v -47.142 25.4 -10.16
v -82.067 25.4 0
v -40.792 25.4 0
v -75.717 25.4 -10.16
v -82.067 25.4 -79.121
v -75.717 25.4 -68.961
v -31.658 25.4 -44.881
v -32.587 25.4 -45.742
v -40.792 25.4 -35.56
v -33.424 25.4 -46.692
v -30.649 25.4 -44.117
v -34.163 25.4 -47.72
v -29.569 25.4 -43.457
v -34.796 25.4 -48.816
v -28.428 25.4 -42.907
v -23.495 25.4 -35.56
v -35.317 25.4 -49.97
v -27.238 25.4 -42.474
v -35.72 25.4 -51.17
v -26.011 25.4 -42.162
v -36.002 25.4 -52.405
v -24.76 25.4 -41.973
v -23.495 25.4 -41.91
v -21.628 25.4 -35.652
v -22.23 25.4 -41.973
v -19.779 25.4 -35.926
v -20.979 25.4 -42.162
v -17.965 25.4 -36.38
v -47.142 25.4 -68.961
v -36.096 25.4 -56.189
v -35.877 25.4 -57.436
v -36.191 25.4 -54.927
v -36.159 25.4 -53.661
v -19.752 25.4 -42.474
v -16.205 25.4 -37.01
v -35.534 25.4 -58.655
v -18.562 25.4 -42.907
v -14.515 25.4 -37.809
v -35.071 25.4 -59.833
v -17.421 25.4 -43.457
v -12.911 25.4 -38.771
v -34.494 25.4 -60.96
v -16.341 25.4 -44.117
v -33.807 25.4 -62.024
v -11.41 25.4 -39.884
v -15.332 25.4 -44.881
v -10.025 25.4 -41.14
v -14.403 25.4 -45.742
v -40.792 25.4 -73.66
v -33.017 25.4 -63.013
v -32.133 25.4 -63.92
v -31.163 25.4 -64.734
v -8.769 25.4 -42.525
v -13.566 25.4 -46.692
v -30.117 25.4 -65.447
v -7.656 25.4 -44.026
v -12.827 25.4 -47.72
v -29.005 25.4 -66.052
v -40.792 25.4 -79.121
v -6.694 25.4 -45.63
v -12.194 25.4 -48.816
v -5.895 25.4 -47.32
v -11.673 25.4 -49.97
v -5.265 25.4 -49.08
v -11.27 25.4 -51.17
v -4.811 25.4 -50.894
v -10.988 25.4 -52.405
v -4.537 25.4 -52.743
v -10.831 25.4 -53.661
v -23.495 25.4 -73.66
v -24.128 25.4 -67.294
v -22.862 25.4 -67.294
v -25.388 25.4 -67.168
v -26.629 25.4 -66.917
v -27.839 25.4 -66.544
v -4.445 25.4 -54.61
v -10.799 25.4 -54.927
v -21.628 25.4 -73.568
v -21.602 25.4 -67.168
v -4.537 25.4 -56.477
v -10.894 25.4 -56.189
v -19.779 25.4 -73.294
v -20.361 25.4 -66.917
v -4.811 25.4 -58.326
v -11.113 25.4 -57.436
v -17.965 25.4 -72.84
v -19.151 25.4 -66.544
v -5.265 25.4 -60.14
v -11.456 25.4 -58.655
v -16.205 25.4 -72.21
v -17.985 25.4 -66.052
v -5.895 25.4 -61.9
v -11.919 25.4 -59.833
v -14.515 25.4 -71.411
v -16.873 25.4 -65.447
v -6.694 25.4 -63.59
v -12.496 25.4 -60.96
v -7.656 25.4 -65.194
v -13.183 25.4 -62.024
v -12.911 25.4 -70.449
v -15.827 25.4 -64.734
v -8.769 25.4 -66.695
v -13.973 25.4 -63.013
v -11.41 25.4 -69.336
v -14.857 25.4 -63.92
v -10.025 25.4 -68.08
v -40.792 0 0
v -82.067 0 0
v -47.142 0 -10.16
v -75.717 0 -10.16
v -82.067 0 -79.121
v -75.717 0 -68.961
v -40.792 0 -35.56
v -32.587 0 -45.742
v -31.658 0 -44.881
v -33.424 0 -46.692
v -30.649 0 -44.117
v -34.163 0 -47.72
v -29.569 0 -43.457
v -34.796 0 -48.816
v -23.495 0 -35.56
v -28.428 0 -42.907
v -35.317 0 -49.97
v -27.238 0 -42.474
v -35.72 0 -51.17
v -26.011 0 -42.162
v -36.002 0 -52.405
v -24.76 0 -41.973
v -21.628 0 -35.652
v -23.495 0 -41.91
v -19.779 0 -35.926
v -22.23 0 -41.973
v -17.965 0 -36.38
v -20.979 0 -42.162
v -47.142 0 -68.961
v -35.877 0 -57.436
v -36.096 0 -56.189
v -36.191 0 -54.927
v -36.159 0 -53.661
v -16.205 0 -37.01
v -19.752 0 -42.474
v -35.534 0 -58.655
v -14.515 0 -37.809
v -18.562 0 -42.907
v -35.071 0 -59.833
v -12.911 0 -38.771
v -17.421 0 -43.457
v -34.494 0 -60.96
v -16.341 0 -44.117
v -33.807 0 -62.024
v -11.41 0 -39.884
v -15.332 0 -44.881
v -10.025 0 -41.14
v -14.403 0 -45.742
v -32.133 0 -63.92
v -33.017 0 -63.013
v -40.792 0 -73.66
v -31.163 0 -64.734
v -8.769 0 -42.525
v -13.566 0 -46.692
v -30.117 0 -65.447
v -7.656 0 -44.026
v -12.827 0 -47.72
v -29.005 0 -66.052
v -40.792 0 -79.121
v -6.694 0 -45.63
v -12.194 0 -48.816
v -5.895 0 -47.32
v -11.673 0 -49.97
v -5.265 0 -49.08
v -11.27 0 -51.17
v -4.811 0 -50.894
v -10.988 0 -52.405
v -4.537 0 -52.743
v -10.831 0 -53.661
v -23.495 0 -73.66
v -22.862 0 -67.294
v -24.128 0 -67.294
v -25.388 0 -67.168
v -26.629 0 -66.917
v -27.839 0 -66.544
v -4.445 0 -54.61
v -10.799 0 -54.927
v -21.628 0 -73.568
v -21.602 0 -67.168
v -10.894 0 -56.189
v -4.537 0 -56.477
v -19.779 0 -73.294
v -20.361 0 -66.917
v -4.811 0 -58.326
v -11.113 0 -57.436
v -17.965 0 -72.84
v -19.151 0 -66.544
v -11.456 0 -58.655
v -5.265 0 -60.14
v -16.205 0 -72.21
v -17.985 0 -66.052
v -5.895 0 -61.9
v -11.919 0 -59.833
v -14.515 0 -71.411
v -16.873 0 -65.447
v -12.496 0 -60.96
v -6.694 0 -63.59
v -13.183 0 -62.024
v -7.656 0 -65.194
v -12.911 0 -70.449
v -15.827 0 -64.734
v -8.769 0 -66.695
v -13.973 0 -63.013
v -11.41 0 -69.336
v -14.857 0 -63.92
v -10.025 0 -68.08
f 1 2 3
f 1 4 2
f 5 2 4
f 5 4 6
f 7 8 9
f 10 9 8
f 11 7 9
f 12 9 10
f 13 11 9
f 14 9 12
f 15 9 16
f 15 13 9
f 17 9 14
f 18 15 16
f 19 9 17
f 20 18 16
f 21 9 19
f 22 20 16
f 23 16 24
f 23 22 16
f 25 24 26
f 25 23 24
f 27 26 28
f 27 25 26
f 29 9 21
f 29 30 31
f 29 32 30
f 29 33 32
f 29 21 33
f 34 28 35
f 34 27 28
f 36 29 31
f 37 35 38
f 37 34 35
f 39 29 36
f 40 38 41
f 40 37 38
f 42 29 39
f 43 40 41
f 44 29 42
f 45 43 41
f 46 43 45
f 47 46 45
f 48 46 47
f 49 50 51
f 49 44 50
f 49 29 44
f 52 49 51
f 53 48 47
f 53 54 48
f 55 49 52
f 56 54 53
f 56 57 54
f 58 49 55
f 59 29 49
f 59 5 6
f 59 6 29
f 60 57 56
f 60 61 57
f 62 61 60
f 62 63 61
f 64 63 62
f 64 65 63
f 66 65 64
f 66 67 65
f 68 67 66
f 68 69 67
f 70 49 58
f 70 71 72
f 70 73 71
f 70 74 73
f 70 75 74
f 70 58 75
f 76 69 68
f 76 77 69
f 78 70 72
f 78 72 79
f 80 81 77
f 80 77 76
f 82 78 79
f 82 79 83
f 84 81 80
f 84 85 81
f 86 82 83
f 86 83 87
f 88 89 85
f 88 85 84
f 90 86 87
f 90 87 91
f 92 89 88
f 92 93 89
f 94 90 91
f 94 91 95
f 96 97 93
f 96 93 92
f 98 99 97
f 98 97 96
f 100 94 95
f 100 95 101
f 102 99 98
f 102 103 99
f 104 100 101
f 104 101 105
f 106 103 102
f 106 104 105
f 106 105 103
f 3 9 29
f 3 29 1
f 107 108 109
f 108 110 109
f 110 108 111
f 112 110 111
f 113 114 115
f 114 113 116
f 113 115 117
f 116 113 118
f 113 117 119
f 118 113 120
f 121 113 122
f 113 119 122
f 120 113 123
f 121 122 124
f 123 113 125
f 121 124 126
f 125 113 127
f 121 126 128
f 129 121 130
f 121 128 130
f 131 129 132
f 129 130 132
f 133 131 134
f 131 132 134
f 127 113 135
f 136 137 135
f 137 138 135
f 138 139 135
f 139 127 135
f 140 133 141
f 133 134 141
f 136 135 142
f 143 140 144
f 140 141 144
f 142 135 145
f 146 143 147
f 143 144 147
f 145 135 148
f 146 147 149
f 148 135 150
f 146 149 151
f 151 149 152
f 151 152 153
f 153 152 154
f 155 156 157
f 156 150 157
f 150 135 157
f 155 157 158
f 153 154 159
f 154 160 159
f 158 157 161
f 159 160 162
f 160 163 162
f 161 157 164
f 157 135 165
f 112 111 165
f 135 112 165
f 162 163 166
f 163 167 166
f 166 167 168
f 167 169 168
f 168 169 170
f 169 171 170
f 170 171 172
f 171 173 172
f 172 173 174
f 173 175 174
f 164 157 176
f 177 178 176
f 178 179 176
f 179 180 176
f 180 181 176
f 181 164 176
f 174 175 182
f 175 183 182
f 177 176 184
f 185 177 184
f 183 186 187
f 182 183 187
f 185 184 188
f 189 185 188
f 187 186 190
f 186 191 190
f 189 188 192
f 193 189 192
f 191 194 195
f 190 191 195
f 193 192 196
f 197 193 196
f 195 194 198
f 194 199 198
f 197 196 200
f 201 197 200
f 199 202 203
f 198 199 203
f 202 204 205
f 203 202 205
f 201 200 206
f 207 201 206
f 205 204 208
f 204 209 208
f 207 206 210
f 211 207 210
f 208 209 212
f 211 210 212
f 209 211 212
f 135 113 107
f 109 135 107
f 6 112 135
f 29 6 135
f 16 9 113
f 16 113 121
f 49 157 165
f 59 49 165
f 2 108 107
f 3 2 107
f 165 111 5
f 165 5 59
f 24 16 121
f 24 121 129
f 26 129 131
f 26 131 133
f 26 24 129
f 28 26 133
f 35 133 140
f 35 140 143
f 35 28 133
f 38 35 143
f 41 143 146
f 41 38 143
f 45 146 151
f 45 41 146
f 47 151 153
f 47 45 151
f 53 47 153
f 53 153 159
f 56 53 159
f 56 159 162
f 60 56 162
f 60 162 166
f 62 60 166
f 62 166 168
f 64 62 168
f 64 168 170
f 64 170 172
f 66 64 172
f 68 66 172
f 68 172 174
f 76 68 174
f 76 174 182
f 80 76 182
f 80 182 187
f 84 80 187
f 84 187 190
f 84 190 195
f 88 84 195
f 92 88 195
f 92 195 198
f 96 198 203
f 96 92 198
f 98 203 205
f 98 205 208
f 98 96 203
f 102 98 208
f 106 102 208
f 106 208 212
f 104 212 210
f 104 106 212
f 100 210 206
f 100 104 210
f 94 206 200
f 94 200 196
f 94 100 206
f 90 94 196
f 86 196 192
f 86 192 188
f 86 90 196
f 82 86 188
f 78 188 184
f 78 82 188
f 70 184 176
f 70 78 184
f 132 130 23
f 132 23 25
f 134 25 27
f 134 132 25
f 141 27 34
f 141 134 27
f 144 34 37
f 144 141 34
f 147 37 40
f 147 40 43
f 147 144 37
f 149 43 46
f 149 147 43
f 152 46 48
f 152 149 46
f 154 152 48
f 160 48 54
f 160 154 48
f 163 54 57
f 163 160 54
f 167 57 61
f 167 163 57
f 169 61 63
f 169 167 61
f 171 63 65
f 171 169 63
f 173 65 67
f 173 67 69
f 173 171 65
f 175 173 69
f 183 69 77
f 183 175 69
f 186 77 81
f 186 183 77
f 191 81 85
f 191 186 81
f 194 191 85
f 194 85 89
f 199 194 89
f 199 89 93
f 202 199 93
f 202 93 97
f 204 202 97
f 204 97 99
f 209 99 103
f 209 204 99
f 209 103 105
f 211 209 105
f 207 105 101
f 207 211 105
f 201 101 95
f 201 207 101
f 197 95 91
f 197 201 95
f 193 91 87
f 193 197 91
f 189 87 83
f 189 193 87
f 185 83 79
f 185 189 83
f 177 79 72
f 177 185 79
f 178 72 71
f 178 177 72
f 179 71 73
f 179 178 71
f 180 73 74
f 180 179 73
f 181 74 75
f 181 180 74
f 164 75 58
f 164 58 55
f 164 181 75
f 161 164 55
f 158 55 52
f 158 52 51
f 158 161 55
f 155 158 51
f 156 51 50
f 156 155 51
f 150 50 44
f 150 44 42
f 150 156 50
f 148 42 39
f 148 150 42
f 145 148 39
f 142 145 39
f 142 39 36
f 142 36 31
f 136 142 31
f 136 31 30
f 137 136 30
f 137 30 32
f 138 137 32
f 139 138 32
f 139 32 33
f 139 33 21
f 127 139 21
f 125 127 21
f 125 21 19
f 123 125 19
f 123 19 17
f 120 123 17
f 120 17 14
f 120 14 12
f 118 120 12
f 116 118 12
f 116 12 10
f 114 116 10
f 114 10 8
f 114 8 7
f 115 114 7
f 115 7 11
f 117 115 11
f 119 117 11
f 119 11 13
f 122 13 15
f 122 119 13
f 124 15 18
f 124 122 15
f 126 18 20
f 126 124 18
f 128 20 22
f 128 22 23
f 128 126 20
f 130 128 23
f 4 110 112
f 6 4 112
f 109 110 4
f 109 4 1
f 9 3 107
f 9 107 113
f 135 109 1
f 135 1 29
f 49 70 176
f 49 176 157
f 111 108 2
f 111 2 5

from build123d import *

# Parameters (mm, degrees)
SKETCH1_W           = 82.0674
SKETCH1_H           = 79.121
SKETCH1_R           = 12.7
SKETCH1_W_2         = 28.575
SKETCH1_H_2         = 58.801
BOSS_EXTRUDE1_DEPTH = 25.4
CUT_EXTRUDE1_REACH  = 118.792


with BuildPart() as part:
    # Sketch1 → Boss-Extrude1 (new body)
    with BuildSketch(Plane(origin=(0, 0, 0), x_dir=(1, 0, 0), z_dir=(0, 1, 0))):
        with Locations((-41.0337, 39.5605)):
            Rectangle(SKETCH1_W, SKETCH1_H)
        with Locations(Location((-23.495, 54.61, 0), (0, 0, 270))):
            Circle(SKETCH1_R, mode=Mode.SUBTRACT)
        with Locations((-61.4299, 39.5605)):
            Rectangle(SKETCH1_W_2, SKETCH1_H_2, mode=Mode.SUBTRACT)
    extrude(amount=BOSS_EXTRUDE1_DEPTH)

    # Sketch2 → Cut-Extrude1 (cut, up to next)
    with BuildSketch(Plane(origin=(0, 25.4, 0), x_dir=(1, 0, 0), z_dir=(0, 1, 0)), mode=Mode.PRIVATE) as cut_extrude1_sk1:
        with BuildLine():
            Line((-40.7924, 0), (-40.7924, 35.56))
            Line((-40.7924, 35.56), (-23.495, 35.56))
            ThreePointArc((-23.495, 35.56), (-4.445, 54.61), (-23.495, 73.66))
            Line((-23.495, 73.66), (-40.7924, 73.66))
            Line((-40.7924, 73.66), (-40.7924, 79.121))
            Line((-40.7924, 79.121), (0, 79.121))
            Line((0, 79.121), (0, 0))
            Line((0, 0), (-40.7924, 0))
        make_face()
    cut_extrude1_tool1 = extrude(cut_extrude1_sk1.sketch, amount=-CUT_EXTRUDE1_REACH, mode=Mode.PRIVATE) & part.part
    add(cut_extrude1_tool1.solids().sort_by_distance((-17.944529, 25.4, -30.304871))[0], mode=Mode.SUBTRACT)


solid = part.part
